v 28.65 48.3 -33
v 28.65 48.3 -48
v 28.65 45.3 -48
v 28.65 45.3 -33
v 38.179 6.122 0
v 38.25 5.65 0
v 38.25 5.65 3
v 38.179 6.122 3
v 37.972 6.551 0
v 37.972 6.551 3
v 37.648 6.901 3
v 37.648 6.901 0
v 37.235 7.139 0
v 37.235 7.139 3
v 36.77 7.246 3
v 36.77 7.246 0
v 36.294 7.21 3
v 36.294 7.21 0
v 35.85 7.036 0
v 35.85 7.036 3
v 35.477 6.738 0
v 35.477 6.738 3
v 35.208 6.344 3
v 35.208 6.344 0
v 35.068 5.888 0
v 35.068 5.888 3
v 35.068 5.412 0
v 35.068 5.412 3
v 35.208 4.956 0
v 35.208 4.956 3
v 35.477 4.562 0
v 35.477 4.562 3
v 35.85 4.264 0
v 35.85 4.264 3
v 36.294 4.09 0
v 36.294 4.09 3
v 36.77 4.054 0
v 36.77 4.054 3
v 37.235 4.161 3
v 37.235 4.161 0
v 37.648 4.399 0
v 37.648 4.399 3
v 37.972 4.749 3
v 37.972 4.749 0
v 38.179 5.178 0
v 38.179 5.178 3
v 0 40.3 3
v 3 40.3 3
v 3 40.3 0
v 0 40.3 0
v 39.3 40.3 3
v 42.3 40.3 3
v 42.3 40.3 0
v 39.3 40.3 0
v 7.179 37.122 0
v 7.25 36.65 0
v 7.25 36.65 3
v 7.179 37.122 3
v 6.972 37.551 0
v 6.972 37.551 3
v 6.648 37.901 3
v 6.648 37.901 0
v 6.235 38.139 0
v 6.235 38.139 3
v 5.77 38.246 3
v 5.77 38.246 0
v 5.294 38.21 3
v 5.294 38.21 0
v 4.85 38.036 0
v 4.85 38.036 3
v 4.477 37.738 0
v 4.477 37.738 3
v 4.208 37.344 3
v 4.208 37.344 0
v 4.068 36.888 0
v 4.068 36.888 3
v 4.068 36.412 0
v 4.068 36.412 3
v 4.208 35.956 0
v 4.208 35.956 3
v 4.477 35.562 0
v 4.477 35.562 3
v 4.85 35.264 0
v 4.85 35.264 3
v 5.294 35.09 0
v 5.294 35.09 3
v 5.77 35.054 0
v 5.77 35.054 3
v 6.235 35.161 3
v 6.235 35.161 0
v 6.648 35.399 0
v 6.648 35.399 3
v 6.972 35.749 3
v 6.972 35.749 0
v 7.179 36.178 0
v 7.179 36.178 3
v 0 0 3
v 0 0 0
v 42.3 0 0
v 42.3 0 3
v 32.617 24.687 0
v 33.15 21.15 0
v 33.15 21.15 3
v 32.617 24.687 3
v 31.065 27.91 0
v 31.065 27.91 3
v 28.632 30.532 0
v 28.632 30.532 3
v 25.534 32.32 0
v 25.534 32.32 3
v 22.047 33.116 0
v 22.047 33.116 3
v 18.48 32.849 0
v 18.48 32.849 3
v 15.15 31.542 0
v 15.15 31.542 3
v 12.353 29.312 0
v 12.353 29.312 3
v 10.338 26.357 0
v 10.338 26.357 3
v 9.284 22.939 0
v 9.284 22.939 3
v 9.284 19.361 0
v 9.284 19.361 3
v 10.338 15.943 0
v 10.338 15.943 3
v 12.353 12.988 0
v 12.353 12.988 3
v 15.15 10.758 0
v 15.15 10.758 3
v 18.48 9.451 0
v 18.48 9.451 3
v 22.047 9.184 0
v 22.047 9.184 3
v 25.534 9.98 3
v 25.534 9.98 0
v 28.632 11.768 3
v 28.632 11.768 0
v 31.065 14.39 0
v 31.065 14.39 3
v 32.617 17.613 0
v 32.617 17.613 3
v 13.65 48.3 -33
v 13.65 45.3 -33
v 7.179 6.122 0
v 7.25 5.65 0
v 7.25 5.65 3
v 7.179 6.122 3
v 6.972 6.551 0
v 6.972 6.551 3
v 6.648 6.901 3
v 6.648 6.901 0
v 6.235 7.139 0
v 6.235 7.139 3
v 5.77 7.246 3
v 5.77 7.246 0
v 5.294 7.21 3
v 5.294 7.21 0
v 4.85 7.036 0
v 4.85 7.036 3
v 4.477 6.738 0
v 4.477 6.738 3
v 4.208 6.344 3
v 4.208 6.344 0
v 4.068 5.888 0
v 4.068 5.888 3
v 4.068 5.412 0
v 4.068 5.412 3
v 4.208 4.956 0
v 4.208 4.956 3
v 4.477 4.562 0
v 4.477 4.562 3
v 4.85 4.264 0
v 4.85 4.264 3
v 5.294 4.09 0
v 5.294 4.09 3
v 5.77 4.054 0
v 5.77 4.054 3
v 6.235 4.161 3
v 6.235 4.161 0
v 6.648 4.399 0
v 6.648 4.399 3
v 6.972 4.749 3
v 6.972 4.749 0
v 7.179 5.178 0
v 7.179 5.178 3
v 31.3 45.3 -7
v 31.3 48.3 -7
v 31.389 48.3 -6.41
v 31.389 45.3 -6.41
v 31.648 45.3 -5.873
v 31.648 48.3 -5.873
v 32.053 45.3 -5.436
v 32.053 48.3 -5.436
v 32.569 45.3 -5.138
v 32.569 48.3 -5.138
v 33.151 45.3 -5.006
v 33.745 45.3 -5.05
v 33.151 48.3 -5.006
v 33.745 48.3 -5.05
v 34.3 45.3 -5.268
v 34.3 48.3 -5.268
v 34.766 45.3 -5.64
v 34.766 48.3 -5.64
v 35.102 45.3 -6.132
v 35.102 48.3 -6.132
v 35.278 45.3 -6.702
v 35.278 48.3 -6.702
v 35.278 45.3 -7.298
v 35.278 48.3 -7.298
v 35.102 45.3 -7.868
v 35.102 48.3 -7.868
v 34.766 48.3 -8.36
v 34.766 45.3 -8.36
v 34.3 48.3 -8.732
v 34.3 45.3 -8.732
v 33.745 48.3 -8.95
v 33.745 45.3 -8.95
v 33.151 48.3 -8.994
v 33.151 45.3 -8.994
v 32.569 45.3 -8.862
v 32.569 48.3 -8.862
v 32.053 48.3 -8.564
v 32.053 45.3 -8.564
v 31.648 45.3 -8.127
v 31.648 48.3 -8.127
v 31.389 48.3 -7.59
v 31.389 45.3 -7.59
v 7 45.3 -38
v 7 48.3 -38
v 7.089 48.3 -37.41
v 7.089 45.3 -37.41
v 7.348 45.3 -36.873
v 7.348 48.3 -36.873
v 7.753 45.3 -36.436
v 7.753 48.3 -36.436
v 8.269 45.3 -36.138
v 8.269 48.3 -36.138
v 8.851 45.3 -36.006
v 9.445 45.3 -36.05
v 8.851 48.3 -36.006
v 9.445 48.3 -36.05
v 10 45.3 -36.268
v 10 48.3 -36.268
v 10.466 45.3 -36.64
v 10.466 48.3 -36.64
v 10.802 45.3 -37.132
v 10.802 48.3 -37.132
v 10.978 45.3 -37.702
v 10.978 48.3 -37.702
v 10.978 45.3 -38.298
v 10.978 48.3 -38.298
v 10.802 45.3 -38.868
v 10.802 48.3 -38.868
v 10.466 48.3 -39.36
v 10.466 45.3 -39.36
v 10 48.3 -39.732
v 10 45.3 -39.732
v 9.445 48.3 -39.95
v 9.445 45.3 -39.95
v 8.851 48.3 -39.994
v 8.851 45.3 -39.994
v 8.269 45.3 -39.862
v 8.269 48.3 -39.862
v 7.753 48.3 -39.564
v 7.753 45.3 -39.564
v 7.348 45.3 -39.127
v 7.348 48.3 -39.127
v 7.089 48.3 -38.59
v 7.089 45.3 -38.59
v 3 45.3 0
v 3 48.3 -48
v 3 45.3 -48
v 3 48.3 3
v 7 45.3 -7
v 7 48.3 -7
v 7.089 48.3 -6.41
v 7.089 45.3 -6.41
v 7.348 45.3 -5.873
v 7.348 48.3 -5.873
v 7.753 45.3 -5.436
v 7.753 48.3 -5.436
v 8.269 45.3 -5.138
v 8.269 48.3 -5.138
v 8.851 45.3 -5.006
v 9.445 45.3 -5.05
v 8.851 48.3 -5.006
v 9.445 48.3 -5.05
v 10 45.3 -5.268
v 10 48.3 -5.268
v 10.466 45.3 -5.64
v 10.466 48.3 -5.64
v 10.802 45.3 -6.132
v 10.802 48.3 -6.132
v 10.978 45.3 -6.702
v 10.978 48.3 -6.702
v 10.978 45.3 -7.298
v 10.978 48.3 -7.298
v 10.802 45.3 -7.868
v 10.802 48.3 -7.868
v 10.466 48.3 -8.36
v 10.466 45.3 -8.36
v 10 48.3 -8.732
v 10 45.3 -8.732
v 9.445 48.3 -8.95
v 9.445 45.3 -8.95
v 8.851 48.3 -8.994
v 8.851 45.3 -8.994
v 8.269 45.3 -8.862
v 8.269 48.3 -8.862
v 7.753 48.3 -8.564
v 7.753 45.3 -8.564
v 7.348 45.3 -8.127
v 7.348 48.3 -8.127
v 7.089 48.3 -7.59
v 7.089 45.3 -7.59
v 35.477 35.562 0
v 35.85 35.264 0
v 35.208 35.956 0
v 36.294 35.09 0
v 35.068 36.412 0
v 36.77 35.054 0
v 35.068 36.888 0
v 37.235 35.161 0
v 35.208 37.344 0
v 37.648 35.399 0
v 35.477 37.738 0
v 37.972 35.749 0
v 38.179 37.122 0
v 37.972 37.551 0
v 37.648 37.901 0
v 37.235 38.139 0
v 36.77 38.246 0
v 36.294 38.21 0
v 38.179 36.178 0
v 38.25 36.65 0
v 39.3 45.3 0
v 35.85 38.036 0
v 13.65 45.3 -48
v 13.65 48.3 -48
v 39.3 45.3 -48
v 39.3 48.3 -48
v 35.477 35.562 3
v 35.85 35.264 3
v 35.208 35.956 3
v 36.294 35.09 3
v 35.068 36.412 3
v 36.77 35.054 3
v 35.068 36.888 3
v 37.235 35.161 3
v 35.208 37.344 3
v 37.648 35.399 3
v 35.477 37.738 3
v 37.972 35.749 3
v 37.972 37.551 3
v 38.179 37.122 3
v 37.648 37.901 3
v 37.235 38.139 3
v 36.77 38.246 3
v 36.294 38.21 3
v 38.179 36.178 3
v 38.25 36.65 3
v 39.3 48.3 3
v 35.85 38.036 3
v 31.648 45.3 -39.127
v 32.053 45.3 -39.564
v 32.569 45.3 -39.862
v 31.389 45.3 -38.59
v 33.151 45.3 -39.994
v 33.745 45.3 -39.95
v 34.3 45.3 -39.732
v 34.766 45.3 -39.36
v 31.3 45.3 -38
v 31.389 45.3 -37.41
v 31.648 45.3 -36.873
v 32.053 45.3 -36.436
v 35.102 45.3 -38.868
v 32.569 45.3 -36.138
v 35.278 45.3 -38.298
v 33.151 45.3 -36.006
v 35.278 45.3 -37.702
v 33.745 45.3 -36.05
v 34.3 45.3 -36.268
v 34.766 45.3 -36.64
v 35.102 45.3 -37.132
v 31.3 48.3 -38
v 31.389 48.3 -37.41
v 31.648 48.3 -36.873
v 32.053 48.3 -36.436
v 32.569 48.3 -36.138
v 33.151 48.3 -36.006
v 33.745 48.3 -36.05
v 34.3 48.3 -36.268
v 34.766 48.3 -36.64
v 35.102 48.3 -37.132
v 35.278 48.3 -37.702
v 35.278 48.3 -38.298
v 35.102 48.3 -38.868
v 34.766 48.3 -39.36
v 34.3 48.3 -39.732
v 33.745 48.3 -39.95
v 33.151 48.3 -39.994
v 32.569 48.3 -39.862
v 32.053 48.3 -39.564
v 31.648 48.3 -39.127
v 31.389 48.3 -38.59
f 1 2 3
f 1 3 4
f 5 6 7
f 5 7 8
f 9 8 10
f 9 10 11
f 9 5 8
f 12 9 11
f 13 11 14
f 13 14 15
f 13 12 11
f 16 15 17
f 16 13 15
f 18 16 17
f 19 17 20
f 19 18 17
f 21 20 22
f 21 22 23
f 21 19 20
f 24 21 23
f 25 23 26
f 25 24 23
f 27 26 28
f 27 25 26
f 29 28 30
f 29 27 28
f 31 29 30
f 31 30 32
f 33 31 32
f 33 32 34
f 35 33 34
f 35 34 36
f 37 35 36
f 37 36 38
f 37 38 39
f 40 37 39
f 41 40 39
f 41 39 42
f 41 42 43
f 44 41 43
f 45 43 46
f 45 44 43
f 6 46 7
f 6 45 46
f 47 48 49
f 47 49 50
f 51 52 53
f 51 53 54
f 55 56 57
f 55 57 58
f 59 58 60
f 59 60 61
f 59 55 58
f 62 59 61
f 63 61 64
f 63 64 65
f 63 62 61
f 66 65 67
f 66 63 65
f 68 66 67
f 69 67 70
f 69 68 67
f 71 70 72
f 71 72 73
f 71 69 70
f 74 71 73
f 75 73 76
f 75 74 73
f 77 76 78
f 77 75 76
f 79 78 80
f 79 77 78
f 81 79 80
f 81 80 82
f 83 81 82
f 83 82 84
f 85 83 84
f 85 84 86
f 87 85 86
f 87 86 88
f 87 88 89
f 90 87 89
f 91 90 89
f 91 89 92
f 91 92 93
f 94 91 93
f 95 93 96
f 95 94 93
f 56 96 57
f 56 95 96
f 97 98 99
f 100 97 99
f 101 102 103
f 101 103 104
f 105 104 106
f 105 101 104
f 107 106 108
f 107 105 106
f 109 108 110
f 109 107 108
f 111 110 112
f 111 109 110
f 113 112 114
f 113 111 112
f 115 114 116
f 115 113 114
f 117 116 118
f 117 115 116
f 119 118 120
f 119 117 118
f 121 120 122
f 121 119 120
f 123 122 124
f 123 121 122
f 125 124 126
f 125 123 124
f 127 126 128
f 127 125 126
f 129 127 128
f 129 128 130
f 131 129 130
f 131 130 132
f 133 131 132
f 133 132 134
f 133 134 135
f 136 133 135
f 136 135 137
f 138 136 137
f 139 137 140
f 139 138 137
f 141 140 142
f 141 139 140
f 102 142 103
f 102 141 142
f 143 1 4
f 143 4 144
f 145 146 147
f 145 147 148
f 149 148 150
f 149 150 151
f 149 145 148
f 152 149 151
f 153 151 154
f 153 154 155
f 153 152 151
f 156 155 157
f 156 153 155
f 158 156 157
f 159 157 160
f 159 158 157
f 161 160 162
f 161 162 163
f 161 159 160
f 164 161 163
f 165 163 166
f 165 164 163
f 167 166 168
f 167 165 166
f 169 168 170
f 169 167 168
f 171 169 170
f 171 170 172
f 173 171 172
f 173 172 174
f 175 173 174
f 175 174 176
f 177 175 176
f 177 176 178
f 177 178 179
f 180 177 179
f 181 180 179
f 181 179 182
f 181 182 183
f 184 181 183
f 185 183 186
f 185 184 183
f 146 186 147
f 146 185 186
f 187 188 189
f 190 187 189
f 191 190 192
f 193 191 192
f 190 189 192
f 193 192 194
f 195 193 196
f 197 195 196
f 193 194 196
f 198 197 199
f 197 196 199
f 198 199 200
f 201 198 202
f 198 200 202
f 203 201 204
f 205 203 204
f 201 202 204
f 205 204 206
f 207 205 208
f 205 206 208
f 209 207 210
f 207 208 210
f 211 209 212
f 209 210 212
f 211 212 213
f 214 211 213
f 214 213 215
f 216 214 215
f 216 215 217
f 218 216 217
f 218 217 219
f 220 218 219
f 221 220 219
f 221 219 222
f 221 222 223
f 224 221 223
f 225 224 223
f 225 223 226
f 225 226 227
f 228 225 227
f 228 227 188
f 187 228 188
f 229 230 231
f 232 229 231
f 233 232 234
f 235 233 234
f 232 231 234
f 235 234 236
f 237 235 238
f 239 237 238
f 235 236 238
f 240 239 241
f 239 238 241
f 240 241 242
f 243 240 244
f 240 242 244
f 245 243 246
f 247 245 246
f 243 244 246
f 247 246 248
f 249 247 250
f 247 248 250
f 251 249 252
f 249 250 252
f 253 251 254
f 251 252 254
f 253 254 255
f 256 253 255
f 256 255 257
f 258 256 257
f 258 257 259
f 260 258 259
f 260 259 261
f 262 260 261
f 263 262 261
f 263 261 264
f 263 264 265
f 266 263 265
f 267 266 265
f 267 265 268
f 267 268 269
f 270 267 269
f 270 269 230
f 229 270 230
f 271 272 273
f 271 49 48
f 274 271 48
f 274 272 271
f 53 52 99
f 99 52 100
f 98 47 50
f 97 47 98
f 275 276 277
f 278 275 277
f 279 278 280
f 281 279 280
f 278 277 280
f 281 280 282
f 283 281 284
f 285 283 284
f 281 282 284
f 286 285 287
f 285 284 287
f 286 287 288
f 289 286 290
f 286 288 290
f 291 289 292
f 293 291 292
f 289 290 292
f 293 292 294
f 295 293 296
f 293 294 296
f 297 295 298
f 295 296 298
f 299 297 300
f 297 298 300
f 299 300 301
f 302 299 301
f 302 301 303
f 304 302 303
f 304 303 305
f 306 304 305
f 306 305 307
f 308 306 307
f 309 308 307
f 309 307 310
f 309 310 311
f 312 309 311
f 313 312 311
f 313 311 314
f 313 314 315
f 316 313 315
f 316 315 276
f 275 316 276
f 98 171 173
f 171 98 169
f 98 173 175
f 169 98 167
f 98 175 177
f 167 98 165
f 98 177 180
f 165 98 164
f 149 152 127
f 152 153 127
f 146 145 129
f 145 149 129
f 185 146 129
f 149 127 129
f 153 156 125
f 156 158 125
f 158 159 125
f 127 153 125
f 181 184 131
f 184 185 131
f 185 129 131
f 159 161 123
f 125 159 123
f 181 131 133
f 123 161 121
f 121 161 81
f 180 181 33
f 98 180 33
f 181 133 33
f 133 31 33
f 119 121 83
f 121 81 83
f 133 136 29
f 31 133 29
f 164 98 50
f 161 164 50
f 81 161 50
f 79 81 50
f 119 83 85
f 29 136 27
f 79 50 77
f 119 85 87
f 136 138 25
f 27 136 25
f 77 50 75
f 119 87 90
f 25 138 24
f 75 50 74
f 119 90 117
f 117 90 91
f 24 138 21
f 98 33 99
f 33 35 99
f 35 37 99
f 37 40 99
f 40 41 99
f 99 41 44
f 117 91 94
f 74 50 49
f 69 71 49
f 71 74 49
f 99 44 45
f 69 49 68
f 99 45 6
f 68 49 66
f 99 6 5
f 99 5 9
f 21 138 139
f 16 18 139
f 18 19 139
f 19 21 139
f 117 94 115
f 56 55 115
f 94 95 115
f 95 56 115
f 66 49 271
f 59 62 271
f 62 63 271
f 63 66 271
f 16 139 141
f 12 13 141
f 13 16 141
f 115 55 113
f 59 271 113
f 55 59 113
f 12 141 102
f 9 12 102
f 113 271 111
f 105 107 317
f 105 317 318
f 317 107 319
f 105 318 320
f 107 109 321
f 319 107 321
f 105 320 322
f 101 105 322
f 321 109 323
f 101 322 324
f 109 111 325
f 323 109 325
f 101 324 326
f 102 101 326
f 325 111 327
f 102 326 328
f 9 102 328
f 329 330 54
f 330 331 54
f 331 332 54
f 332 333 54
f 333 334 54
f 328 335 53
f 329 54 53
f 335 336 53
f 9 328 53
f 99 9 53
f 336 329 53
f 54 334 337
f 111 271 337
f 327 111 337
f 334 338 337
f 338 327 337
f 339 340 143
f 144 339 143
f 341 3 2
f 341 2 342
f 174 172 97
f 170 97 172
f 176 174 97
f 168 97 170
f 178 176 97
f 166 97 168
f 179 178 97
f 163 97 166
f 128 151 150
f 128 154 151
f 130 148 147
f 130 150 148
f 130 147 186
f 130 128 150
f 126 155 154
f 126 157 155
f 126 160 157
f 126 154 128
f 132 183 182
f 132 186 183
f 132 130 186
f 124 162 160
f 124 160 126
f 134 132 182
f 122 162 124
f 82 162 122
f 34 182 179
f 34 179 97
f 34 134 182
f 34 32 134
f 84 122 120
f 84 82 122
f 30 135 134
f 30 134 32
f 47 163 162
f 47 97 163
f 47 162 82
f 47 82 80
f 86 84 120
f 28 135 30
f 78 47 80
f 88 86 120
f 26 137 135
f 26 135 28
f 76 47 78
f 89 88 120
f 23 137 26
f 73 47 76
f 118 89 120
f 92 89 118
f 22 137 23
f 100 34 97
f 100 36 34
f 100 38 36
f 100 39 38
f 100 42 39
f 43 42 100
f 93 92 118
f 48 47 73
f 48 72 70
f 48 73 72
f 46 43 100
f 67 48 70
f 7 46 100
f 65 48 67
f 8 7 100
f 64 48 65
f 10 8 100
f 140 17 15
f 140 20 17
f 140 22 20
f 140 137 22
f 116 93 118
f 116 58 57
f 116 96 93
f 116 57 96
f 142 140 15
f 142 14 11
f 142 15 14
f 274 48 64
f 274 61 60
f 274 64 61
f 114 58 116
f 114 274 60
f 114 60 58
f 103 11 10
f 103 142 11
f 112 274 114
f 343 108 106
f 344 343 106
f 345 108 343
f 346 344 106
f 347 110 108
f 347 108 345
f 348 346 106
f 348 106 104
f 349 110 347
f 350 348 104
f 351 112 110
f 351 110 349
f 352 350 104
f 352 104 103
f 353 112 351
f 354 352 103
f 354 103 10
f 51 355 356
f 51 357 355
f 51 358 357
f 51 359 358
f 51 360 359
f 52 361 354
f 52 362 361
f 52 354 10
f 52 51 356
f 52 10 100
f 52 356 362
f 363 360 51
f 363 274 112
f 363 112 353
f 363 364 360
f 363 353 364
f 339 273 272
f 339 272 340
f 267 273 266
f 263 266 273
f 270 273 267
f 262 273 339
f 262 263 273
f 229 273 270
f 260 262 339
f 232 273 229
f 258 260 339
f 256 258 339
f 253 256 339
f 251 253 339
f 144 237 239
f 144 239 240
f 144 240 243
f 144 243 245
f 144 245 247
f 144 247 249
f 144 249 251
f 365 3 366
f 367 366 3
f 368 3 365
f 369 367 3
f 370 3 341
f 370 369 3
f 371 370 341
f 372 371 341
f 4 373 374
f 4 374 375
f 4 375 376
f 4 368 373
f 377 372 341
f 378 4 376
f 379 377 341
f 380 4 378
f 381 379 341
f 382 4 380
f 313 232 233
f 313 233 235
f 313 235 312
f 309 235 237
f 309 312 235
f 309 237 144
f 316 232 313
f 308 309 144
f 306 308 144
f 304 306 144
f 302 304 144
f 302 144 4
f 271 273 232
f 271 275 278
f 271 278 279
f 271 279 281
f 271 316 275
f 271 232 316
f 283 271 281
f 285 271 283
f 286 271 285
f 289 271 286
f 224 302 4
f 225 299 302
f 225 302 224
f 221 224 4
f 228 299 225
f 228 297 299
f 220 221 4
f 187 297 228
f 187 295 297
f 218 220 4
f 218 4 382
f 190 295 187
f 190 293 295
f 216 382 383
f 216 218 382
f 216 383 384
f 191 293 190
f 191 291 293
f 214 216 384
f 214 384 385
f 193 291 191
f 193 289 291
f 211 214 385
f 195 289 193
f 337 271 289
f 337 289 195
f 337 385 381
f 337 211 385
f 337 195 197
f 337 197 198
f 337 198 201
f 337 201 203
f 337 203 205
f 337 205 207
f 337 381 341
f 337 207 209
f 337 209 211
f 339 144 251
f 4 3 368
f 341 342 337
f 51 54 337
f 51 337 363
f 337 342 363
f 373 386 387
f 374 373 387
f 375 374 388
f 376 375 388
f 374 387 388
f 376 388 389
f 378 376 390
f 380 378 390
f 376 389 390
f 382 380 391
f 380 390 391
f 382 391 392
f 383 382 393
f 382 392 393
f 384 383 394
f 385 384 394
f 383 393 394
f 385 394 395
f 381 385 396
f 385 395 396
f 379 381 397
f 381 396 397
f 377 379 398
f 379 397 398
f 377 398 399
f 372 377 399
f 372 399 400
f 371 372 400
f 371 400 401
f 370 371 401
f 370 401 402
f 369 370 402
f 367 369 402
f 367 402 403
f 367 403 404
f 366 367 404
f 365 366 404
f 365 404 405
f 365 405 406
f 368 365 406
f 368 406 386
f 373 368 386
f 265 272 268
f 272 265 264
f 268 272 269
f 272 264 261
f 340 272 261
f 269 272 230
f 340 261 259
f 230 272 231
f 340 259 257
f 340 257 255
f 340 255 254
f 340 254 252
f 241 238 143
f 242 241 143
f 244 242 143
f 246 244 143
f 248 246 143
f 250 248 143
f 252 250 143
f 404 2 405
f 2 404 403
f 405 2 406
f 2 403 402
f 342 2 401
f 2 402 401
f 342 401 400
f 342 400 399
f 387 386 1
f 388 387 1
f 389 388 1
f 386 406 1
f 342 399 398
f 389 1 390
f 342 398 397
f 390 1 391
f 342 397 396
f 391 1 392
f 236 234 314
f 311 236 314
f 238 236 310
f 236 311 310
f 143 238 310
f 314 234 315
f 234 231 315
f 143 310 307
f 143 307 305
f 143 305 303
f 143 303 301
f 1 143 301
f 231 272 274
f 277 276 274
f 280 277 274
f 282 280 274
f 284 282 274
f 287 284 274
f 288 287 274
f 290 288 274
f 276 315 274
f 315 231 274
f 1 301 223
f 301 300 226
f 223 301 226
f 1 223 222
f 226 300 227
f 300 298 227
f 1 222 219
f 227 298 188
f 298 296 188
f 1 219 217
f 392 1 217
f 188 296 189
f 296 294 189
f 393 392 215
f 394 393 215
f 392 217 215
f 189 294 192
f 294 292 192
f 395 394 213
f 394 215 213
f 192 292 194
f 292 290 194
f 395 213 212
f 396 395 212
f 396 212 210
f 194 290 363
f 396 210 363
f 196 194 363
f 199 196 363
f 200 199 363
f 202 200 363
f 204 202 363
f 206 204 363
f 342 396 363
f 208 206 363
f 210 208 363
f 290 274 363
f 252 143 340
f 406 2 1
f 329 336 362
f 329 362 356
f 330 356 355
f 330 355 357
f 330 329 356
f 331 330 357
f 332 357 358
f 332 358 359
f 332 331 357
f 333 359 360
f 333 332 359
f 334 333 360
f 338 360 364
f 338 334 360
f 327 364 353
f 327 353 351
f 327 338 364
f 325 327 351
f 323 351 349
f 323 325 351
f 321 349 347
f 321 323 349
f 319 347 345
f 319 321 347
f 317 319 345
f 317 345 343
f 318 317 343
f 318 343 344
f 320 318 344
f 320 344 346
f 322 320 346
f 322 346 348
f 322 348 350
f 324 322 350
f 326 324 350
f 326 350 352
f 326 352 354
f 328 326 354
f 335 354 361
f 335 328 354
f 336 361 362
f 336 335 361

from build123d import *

# Parameters (mm, degrees)
SKETCH_R      = 1.6
SKETCH_R_2    = 12
PAD_DEPTH     = 3
SKETCH001_W   = 42.3
SKETCH001_H   = 3
PAD001_DEPTH  = 48
SKETCH002_R   = 2
SKETCH002_W   = 15
SKETCH002_H   = 15
SKETCH002_W_2 = 3
SKETCH002_H_2 = 51
POCKET_DEPTH  = 8


with BuildPart() as part:
    # Sketch → Pad (new body)
    with BuildSketch(Plane.XY):
        Polygon((0, 0), (42.3, 0), (42.3, 42.3), (42.3, 48.3), (0, 48.3), (0, 42.3), align=None)
        with Locations((5.65, 36.65)):
            Circle(SKETCH_R, mode=Mode.SUBTRACT)
        with Locations((36.65, 36.65)):
            Circle(SKETCH_R, mode=Mode.SUBTRACT)
        with Locations((5.65, 5.65)):
            Circle(SKETCH_R, mode=Mode.SUBTRACT)
        with Locations((36.65, 5.65)):
            Circle(SKETCH_R, mode=Mode.SUBTRACT)
        with Locations((21.15, 21.15)):
            Circle(SKETCH_R_2, mode=Mode.SUBTRACT)
    extrude(amount=PAD_DEPTH)

    # Sketch001 → Pad001 (new body)
    with BuildSketch(Plane(origin=(0, 0, 0), x_dir=(1, 0, 0), z_dir=(0, 0, -1))):
        with Locations((21.15, -46.8)):
            Rectangle(SKETCH001_W, SKETCH001_H)
    extrude(amount=PAD001_DEPTH)

    # Sketch002 → Pocket (cut)
    with BuildSketch(Plane(origin=(0, 48.3, 0), x_dir=(-1, 0, 0), z_dir=(0, 1, 0))):
        with Locations((-33.3, -7)):
            Circle(SKETCH002_R)
        with Locations((-9, -7)):
            Circle(SKETCH002_R)
        with Locations((-33.3, -38)):
            Circle(SKETCH002_R)
        with Locations((-9, -38)):
            Circle(SKETCH002_R)
        with Locations((-21.15, -40.5)):
            Rectangle(SKETCH002_W, SKETCH002_H)
        with Locations((-1.5, -22.5)):
            Rectangle(SKETCH002_W_2, SKETCH002_H_2)
        with Locations((-40.8, -22.5)):
            Rectangle(SKETCH002_W_2, SKETCH002_H_2)
    extrude(amount=-POCKET_DEPTH, mode=Mode.SUBTRACT)


solid = part.part
